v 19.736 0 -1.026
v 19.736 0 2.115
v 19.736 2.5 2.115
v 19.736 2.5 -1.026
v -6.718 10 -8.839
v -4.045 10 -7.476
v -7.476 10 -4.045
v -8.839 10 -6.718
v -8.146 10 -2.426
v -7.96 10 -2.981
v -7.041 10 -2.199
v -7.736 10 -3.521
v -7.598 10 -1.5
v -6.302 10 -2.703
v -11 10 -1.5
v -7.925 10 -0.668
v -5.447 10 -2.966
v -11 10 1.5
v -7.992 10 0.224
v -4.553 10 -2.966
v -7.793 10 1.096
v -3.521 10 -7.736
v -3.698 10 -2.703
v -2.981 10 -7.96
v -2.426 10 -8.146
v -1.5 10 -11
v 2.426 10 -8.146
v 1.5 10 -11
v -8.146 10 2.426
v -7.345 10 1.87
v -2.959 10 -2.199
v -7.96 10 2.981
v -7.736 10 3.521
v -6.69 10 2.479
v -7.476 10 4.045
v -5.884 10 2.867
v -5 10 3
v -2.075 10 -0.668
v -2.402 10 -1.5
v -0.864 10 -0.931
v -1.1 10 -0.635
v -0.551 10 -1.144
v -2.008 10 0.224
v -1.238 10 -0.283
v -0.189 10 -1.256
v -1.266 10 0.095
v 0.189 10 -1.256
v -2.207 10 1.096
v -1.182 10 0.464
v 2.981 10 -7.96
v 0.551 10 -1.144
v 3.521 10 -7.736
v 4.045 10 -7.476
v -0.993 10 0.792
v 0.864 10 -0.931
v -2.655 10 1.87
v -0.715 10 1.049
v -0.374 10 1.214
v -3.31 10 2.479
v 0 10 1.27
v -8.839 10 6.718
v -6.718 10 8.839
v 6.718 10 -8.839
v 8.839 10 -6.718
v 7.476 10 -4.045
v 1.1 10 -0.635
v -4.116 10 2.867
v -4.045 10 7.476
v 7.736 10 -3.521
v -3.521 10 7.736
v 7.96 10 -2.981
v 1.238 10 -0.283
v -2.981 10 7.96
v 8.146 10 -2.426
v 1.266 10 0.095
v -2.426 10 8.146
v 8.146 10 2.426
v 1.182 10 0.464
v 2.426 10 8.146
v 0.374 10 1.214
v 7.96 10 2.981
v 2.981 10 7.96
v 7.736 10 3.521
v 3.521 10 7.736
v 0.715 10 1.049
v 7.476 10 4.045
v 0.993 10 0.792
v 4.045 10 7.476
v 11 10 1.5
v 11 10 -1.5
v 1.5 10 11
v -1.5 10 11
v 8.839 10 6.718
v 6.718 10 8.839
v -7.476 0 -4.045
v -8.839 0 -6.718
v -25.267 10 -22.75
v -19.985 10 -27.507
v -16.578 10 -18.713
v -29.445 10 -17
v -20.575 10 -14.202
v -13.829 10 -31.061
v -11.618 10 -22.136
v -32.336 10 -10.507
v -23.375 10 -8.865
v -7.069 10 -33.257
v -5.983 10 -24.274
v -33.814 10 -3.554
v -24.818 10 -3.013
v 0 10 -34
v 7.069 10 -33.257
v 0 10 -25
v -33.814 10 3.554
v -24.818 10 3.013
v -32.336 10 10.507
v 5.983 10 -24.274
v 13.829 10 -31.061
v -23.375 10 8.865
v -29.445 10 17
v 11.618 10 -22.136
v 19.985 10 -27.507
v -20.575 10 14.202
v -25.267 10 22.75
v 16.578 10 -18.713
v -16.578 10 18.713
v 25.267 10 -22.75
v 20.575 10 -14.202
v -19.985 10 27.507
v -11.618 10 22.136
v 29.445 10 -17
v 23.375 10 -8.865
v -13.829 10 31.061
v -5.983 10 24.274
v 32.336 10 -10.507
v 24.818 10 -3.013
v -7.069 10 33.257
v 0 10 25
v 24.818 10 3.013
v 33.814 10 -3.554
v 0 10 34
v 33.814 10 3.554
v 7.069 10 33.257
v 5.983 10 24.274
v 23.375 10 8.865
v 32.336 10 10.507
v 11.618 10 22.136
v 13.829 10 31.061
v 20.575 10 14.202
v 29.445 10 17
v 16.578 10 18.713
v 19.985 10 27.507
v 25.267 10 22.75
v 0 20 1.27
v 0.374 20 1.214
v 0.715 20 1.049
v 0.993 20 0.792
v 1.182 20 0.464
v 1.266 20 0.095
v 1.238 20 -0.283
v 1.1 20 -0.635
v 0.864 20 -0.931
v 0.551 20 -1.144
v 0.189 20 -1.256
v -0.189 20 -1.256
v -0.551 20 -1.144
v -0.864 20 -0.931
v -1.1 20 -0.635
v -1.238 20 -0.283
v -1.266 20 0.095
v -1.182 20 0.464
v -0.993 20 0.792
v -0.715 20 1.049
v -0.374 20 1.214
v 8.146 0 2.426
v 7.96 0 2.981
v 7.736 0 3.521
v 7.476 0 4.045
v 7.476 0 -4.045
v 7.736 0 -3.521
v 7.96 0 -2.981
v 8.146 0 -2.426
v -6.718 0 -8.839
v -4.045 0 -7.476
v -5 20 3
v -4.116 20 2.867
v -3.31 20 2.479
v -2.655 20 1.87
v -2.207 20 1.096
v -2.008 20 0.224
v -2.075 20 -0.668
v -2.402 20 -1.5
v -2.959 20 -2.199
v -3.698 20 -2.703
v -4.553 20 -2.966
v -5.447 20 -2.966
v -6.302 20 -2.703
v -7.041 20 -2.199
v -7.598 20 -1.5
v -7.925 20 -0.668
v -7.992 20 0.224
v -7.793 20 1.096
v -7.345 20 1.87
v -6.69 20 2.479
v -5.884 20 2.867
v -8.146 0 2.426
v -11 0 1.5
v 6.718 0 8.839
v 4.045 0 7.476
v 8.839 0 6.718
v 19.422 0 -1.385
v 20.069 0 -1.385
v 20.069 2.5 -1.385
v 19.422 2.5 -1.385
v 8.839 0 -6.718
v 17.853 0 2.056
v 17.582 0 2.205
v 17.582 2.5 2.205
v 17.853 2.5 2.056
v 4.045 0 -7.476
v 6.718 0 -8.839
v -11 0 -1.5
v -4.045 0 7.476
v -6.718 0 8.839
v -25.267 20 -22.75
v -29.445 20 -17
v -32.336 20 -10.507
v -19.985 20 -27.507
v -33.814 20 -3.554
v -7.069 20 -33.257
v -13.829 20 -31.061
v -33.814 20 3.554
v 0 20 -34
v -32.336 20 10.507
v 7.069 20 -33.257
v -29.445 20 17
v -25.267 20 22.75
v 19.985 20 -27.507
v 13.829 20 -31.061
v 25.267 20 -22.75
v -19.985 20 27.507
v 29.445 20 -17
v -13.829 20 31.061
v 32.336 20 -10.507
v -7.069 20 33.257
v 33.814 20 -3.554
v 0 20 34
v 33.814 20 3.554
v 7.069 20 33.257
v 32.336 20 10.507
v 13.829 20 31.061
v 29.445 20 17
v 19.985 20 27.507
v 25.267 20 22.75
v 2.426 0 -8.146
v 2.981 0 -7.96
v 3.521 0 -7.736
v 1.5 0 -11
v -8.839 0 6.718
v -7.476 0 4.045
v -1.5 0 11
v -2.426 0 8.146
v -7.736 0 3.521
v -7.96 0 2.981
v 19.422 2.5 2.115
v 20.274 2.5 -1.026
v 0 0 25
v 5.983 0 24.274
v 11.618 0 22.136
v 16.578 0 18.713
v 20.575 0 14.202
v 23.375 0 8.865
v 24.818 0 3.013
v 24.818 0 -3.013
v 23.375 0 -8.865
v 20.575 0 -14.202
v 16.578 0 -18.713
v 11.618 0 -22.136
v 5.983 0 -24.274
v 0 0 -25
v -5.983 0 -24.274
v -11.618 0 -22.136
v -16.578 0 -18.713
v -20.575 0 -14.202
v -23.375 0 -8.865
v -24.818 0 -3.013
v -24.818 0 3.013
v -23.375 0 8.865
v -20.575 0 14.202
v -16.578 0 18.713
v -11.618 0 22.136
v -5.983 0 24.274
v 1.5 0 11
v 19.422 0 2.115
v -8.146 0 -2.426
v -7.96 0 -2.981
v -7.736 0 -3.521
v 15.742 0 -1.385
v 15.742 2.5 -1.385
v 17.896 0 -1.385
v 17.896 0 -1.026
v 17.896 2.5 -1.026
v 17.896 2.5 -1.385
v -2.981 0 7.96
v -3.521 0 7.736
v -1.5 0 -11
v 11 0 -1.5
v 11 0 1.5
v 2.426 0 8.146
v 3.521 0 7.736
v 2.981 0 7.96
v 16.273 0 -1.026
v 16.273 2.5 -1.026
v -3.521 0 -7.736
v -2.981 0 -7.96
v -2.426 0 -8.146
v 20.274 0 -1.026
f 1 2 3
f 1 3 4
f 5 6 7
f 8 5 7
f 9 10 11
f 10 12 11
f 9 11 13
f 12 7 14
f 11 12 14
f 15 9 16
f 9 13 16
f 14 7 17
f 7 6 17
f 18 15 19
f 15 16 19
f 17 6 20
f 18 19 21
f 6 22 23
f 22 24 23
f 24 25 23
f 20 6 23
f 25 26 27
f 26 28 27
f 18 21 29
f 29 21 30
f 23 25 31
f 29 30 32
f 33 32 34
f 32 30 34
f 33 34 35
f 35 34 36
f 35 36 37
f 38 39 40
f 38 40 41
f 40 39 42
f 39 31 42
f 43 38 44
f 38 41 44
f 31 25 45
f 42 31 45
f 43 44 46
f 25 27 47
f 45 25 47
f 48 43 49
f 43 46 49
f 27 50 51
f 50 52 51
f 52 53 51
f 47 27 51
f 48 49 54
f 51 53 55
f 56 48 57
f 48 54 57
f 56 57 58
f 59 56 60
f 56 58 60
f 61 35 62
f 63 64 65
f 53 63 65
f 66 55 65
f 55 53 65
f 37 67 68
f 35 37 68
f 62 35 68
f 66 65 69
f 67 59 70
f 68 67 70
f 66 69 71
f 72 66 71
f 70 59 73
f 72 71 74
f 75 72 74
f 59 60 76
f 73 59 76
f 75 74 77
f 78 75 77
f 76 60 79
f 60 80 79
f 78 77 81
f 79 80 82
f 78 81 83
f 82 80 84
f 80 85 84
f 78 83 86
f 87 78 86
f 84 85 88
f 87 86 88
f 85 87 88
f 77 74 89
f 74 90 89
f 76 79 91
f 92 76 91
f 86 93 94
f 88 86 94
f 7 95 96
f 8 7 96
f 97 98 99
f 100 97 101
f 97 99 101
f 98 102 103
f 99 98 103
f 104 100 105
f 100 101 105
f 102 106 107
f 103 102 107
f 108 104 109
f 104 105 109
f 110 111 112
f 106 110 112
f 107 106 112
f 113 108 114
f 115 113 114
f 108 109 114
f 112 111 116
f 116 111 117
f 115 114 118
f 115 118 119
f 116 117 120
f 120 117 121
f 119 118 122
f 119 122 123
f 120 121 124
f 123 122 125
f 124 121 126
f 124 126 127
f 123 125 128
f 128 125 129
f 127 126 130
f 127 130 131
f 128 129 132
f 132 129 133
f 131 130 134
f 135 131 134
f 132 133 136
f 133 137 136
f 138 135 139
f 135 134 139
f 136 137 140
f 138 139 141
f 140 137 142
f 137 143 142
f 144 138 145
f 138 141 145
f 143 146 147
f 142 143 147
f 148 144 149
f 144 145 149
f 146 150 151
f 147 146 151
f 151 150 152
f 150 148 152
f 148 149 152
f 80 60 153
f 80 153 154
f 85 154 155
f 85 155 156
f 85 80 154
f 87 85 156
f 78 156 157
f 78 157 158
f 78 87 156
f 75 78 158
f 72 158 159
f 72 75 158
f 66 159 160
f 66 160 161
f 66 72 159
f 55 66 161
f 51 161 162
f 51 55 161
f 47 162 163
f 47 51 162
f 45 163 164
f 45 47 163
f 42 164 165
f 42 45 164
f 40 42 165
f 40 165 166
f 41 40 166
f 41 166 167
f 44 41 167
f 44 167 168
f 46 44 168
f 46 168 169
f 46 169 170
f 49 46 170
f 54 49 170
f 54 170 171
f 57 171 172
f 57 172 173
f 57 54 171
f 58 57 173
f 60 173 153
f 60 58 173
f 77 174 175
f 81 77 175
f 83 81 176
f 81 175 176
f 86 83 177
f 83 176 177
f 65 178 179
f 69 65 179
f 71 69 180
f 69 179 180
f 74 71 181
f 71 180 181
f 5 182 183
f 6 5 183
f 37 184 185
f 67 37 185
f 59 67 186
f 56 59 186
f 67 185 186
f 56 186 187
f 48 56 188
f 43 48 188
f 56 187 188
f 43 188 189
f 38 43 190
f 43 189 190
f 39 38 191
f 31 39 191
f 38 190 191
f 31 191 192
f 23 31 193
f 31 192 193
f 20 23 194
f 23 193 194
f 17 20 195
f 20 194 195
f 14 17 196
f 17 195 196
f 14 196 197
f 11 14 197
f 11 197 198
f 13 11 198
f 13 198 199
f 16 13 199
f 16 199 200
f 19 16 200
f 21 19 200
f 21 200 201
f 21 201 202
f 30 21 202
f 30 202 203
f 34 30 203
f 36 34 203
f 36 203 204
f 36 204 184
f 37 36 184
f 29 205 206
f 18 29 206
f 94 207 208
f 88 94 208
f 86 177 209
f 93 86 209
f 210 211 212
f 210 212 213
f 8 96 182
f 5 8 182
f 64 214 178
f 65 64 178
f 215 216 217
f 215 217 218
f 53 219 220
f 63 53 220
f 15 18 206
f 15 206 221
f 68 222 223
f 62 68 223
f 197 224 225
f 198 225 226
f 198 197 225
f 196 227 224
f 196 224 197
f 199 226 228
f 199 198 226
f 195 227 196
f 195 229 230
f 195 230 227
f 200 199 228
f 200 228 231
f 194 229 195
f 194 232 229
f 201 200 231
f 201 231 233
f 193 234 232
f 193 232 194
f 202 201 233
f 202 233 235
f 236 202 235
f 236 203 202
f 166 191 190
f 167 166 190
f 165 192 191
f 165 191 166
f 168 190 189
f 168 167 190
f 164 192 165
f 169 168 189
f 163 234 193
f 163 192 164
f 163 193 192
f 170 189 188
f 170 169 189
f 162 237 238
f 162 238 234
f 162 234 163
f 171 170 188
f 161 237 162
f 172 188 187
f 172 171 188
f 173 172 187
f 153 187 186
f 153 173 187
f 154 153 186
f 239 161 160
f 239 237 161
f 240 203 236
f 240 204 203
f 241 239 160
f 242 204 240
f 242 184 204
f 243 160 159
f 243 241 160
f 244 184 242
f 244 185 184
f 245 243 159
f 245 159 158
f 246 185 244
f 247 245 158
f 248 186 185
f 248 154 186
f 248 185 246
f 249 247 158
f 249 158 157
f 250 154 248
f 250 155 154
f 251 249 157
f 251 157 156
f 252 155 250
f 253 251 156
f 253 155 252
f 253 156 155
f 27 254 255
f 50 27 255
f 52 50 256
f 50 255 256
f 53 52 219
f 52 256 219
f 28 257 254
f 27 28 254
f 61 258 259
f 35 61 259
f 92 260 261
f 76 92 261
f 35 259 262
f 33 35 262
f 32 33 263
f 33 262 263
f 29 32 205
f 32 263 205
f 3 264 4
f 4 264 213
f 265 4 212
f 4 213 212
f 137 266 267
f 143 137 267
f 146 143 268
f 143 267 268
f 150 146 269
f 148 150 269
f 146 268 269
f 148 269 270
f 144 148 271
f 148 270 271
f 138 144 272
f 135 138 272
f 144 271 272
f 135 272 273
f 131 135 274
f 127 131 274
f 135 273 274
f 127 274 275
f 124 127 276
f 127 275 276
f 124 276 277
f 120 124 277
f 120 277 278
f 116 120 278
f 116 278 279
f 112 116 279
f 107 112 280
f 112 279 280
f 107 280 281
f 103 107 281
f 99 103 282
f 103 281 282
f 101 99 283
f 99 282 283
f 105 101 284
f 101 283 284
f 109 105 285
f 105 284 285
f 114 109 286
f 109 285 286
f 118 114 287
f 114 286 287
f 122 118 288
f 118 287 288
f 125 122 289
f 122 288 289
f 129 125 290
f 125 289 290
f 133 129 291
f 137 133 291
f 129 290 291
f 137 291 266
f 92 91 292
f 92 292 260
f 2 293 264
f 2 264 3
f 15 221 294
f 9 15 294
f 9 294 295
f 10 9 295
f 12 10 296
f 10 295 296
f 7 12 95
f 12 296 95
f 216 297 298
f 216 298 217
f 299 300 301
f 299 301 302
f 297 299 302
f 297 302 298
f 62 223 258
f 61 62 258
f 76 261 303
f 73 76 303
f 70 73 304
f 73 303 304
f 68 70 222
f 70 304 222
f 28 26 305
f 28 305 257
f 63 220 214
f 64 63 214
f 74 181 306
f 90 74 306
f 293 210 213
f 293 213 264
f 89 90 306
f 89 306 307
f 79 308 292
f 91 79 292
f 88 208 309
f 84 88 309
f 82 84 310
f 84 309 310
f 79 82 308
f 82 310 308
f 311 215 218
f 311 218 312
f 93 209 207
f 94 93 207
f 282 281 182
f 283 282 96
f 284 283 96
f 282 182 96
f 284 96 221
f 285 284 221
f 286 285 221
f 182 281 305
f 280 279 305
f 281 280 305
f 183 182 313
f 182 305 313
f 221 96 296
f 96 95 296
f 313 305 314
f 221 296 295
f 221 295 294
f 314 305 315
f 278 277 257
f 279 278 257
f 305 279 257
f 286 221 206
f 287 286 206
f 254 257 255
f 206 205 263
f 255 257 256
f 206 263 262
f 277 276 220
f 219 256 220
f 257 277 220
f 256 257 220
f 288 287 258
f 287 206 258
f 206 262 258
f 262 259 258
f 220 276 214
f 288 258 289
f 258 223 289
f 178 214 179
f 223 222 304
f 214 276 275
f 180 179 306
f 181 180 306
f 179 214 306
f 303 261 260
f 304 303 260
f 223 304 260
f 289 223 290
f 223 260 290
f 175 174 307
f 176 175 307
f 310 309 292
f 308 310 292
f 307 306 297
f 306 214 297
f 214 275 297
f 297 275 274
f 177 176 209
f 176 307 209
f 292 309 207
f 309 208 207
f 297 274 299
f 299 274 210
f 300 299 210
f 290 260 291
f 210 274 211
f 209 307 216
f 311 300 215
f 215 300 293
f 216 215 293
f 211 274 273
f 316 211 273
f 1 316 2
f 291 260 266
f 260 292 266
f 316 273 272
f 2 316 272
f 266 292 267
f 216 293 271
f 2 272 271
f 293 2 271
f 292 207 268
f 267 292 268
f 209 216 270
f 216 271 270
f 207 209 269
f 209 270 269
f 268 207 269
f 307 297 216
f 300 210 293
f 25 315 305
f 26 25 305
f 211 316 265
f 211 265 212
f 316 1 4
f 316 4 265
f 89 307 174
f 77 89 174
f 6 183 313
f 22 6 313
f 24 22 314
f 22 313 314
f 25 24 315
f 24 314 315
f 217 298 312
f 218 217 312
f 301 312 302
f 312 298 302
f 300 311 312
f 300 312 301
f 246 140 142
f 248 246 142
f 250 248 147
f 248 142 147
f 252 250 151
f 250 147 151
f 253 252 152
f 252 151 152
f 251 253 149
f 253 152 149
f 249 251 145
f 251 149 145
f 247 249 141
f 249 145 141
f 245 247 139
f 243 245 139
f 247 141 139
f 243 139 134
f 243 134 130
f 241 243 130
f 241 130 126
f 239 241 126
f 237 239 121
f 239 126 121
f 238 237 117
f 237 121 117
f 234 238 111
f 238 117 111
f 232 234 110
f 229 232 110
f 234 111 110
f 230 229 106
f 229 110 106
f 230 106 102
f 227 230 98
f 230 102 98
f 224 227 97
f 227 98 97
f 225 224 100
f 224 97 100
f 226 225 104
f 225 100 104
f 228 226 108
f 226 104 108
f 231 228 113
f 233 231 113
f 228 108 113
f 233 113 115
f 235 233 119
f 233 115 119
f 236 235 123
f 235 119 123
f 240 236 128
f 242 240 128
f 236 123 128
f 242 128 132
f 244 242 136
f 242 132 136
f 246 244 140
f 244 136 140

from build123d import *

# Parameters (mm, degrees)
SKETCH1_R           = 25
BOSS_EXTRUDE1_DEPTH = 10
SKETCH2_R           = 34
SKETCH2_R_2         = 1.27
BOSS_EXTRUDE2_DEPTH = 10
SKETCH3_R           = 3
CUT_EXTRUDE1_DEPTH  = 53.076866265
CUT_EXTRUDE2_DEPTH  = 2.5


with BuildPart() as part:
    # Sketch1 → Boss-Extrude1 (new body)
    with BuildSketch(Plane(origin=(0, 0, 0), x_dir=(1, 0, 0), z_dir=(0, 1, 0))):
        with Locations(Location((0, 0, 0), (0, 0, 270))):
            Circle(SKETCH1_R)
        with BuildLine():
            Line((-1.5, 11), (1.5, 11))
            Line((1.5, 11), (2.425924848, 8.146464793))
            ThreePointArc((2.425924848, 8.146464793), (3.252809175, 7.852976026), (4.045032587, 7.475808409))
            Line((4.045032587, 7.475808409), (6.717514421, 8.838834765))
            Line((6.717514421, 8.838834765), (8.838834765, 6.717514421))
            Line((8.838834765, 6.717514421), (7.475808409, 4.045032587))
            ThreePointArc((7.475808409, 4.045032587), (7.852976026, 3.252809175), (8.146464793, 2.425924848))
            Line((8.146464793, 2.425924848), (11, 1.5))
            Line((11, 1.5), (11, -1.5))
            Line((11, -1.5), (8.146464793, -2.425924848))
            ThreePointArc((8.146464793, -2.425924848), (7.852976026, -3.252809175), (7.475808409, -4.045032587))
            Line((7.475808409, -4.045032587), (8.838834765, -6.717514421))
            Line((8.838834765, -6.717514421), (6.717514421, -8.838834765))
            Line((6.717514421, -8.838834765), (4.045032587, -7.475808409))
            ThreePointArc((4.045032587, -7.475808409), (3.252809175, -7.852976026), (2.425924848, -8.146464793))
            Line((2.425924848, -8.146464793), (1.5, -11))
            Line((1.5, -11), (-1.5, -11))
            Line((-1.5, -11), (-2.425924848, -8.146464793))
            ThreePointArc((-2.425924848, -8.146464793), (-3.252809175, -7.852976026), (-4.045032587, -7.475808409))
            Line((-4.045032587, -7.475808409), (-6.717514421, -8.838834765))
            Line((-6.717514421, -8.838834765), (-8.838834765, -6.717514421))
            Line((-8.838834765, -6.717514421), (-7.475808409, -4.045032587))
            ThreePointArc((-7.475808409, -4.045032587), (-7.852976026, -3.252809175), (-8.146464793, -2.425924848))
            Line((-8.146464793, -2.425924848), (-11, -1.5))
            Line((-11, -1.5), (-11, 1.5))
            Line((-11, 1.5), (-8.146464793, 2.425924848))
            ThreePointArc((-8.146464793, 2.425924848), (-7.852976026, 3.252809175), (-7.475808409, 4.045032587))
            Line((-7.475808409, 4.045032587), (-8.838834765, 6.717514421))
            Line((-8.838834765, 6.717514421), (-6.717514421, 8.838834765))
            Line((-6.717514421, 8.838834765), (-4.045032587, 7.475808409))
            ThreePointArc((-4.045032587, 7.475808409), (-3.252809175, 7.852976026), (-2.425924848, 8.146464793))
            Line((-2.425924848, 8.146464793), (-1.5, 11))
        make_face(mode=Mode.SUBTRACT)
    extrude(amount=BOSS_EXTRUDE1_DEPTH)

    # Sketch2 → Boss-Extrude2 (add)
    with BuildSketch(Plane(origin=(0, 10, 0), x_dir=(1, 0, 0), z_dir=(0, 1, 0))):
        with Locations(Location((0, 0, 0), (0, 0, 270))):
            Circle(SKETCH2_R)
        with Locations(Location((0, 0, 0), (0, 0, 270))):
            Circle(SKETCH2_R_2, mode=Mode.SUBTRACT)
    extrude(amount=BOSS_EXTRUDE2_DEPTH)

    # Sketch3 → Cut-Extrude1 (cut, through all)
    with BuildSketch(Plane(origin=(0, 20, 0), x_dir=(1, 0, 0), z_dir=(0, 1, 0))):
        with Locations(Location((-5, 0, 0), (0, 0, 270))):
            Circle(SKETCH3_R)
    extrude(amount=-CUT_EXTRUDE1_DEPTH, mode=Mode.SUBTRACT)

    # Sketch4 → Cut-Extrude2 (cut)
    with BuildSketch(Plane(origin=(0, 0, 0), x_dir=(-1, 0, 0), z_dir=(0, -1, 0))):
        Polygon((-20.068660666, 1.384852309), (-19.421525249, 1.384852309), (-19.421525249, -2.115147691), (-19.735627813, -2.115147691), (-19.735627813, 1.02587795), (-20.274089352, 1.02587795), align=None)
        Polygon((-17.895884224, 1.384852309), (-15.74203807, 1.384852309), (-17.581781659, -2.20489128), (-17.853115794, -2.055552338), (-16.27348839, 1.02587795), (-17.895884224, 1.02587795), align=None)
    extrude(amount=-CUT_EXTRUDE2_DEPTH, mode=Mode.SUBTRACT)


solid = part.part
